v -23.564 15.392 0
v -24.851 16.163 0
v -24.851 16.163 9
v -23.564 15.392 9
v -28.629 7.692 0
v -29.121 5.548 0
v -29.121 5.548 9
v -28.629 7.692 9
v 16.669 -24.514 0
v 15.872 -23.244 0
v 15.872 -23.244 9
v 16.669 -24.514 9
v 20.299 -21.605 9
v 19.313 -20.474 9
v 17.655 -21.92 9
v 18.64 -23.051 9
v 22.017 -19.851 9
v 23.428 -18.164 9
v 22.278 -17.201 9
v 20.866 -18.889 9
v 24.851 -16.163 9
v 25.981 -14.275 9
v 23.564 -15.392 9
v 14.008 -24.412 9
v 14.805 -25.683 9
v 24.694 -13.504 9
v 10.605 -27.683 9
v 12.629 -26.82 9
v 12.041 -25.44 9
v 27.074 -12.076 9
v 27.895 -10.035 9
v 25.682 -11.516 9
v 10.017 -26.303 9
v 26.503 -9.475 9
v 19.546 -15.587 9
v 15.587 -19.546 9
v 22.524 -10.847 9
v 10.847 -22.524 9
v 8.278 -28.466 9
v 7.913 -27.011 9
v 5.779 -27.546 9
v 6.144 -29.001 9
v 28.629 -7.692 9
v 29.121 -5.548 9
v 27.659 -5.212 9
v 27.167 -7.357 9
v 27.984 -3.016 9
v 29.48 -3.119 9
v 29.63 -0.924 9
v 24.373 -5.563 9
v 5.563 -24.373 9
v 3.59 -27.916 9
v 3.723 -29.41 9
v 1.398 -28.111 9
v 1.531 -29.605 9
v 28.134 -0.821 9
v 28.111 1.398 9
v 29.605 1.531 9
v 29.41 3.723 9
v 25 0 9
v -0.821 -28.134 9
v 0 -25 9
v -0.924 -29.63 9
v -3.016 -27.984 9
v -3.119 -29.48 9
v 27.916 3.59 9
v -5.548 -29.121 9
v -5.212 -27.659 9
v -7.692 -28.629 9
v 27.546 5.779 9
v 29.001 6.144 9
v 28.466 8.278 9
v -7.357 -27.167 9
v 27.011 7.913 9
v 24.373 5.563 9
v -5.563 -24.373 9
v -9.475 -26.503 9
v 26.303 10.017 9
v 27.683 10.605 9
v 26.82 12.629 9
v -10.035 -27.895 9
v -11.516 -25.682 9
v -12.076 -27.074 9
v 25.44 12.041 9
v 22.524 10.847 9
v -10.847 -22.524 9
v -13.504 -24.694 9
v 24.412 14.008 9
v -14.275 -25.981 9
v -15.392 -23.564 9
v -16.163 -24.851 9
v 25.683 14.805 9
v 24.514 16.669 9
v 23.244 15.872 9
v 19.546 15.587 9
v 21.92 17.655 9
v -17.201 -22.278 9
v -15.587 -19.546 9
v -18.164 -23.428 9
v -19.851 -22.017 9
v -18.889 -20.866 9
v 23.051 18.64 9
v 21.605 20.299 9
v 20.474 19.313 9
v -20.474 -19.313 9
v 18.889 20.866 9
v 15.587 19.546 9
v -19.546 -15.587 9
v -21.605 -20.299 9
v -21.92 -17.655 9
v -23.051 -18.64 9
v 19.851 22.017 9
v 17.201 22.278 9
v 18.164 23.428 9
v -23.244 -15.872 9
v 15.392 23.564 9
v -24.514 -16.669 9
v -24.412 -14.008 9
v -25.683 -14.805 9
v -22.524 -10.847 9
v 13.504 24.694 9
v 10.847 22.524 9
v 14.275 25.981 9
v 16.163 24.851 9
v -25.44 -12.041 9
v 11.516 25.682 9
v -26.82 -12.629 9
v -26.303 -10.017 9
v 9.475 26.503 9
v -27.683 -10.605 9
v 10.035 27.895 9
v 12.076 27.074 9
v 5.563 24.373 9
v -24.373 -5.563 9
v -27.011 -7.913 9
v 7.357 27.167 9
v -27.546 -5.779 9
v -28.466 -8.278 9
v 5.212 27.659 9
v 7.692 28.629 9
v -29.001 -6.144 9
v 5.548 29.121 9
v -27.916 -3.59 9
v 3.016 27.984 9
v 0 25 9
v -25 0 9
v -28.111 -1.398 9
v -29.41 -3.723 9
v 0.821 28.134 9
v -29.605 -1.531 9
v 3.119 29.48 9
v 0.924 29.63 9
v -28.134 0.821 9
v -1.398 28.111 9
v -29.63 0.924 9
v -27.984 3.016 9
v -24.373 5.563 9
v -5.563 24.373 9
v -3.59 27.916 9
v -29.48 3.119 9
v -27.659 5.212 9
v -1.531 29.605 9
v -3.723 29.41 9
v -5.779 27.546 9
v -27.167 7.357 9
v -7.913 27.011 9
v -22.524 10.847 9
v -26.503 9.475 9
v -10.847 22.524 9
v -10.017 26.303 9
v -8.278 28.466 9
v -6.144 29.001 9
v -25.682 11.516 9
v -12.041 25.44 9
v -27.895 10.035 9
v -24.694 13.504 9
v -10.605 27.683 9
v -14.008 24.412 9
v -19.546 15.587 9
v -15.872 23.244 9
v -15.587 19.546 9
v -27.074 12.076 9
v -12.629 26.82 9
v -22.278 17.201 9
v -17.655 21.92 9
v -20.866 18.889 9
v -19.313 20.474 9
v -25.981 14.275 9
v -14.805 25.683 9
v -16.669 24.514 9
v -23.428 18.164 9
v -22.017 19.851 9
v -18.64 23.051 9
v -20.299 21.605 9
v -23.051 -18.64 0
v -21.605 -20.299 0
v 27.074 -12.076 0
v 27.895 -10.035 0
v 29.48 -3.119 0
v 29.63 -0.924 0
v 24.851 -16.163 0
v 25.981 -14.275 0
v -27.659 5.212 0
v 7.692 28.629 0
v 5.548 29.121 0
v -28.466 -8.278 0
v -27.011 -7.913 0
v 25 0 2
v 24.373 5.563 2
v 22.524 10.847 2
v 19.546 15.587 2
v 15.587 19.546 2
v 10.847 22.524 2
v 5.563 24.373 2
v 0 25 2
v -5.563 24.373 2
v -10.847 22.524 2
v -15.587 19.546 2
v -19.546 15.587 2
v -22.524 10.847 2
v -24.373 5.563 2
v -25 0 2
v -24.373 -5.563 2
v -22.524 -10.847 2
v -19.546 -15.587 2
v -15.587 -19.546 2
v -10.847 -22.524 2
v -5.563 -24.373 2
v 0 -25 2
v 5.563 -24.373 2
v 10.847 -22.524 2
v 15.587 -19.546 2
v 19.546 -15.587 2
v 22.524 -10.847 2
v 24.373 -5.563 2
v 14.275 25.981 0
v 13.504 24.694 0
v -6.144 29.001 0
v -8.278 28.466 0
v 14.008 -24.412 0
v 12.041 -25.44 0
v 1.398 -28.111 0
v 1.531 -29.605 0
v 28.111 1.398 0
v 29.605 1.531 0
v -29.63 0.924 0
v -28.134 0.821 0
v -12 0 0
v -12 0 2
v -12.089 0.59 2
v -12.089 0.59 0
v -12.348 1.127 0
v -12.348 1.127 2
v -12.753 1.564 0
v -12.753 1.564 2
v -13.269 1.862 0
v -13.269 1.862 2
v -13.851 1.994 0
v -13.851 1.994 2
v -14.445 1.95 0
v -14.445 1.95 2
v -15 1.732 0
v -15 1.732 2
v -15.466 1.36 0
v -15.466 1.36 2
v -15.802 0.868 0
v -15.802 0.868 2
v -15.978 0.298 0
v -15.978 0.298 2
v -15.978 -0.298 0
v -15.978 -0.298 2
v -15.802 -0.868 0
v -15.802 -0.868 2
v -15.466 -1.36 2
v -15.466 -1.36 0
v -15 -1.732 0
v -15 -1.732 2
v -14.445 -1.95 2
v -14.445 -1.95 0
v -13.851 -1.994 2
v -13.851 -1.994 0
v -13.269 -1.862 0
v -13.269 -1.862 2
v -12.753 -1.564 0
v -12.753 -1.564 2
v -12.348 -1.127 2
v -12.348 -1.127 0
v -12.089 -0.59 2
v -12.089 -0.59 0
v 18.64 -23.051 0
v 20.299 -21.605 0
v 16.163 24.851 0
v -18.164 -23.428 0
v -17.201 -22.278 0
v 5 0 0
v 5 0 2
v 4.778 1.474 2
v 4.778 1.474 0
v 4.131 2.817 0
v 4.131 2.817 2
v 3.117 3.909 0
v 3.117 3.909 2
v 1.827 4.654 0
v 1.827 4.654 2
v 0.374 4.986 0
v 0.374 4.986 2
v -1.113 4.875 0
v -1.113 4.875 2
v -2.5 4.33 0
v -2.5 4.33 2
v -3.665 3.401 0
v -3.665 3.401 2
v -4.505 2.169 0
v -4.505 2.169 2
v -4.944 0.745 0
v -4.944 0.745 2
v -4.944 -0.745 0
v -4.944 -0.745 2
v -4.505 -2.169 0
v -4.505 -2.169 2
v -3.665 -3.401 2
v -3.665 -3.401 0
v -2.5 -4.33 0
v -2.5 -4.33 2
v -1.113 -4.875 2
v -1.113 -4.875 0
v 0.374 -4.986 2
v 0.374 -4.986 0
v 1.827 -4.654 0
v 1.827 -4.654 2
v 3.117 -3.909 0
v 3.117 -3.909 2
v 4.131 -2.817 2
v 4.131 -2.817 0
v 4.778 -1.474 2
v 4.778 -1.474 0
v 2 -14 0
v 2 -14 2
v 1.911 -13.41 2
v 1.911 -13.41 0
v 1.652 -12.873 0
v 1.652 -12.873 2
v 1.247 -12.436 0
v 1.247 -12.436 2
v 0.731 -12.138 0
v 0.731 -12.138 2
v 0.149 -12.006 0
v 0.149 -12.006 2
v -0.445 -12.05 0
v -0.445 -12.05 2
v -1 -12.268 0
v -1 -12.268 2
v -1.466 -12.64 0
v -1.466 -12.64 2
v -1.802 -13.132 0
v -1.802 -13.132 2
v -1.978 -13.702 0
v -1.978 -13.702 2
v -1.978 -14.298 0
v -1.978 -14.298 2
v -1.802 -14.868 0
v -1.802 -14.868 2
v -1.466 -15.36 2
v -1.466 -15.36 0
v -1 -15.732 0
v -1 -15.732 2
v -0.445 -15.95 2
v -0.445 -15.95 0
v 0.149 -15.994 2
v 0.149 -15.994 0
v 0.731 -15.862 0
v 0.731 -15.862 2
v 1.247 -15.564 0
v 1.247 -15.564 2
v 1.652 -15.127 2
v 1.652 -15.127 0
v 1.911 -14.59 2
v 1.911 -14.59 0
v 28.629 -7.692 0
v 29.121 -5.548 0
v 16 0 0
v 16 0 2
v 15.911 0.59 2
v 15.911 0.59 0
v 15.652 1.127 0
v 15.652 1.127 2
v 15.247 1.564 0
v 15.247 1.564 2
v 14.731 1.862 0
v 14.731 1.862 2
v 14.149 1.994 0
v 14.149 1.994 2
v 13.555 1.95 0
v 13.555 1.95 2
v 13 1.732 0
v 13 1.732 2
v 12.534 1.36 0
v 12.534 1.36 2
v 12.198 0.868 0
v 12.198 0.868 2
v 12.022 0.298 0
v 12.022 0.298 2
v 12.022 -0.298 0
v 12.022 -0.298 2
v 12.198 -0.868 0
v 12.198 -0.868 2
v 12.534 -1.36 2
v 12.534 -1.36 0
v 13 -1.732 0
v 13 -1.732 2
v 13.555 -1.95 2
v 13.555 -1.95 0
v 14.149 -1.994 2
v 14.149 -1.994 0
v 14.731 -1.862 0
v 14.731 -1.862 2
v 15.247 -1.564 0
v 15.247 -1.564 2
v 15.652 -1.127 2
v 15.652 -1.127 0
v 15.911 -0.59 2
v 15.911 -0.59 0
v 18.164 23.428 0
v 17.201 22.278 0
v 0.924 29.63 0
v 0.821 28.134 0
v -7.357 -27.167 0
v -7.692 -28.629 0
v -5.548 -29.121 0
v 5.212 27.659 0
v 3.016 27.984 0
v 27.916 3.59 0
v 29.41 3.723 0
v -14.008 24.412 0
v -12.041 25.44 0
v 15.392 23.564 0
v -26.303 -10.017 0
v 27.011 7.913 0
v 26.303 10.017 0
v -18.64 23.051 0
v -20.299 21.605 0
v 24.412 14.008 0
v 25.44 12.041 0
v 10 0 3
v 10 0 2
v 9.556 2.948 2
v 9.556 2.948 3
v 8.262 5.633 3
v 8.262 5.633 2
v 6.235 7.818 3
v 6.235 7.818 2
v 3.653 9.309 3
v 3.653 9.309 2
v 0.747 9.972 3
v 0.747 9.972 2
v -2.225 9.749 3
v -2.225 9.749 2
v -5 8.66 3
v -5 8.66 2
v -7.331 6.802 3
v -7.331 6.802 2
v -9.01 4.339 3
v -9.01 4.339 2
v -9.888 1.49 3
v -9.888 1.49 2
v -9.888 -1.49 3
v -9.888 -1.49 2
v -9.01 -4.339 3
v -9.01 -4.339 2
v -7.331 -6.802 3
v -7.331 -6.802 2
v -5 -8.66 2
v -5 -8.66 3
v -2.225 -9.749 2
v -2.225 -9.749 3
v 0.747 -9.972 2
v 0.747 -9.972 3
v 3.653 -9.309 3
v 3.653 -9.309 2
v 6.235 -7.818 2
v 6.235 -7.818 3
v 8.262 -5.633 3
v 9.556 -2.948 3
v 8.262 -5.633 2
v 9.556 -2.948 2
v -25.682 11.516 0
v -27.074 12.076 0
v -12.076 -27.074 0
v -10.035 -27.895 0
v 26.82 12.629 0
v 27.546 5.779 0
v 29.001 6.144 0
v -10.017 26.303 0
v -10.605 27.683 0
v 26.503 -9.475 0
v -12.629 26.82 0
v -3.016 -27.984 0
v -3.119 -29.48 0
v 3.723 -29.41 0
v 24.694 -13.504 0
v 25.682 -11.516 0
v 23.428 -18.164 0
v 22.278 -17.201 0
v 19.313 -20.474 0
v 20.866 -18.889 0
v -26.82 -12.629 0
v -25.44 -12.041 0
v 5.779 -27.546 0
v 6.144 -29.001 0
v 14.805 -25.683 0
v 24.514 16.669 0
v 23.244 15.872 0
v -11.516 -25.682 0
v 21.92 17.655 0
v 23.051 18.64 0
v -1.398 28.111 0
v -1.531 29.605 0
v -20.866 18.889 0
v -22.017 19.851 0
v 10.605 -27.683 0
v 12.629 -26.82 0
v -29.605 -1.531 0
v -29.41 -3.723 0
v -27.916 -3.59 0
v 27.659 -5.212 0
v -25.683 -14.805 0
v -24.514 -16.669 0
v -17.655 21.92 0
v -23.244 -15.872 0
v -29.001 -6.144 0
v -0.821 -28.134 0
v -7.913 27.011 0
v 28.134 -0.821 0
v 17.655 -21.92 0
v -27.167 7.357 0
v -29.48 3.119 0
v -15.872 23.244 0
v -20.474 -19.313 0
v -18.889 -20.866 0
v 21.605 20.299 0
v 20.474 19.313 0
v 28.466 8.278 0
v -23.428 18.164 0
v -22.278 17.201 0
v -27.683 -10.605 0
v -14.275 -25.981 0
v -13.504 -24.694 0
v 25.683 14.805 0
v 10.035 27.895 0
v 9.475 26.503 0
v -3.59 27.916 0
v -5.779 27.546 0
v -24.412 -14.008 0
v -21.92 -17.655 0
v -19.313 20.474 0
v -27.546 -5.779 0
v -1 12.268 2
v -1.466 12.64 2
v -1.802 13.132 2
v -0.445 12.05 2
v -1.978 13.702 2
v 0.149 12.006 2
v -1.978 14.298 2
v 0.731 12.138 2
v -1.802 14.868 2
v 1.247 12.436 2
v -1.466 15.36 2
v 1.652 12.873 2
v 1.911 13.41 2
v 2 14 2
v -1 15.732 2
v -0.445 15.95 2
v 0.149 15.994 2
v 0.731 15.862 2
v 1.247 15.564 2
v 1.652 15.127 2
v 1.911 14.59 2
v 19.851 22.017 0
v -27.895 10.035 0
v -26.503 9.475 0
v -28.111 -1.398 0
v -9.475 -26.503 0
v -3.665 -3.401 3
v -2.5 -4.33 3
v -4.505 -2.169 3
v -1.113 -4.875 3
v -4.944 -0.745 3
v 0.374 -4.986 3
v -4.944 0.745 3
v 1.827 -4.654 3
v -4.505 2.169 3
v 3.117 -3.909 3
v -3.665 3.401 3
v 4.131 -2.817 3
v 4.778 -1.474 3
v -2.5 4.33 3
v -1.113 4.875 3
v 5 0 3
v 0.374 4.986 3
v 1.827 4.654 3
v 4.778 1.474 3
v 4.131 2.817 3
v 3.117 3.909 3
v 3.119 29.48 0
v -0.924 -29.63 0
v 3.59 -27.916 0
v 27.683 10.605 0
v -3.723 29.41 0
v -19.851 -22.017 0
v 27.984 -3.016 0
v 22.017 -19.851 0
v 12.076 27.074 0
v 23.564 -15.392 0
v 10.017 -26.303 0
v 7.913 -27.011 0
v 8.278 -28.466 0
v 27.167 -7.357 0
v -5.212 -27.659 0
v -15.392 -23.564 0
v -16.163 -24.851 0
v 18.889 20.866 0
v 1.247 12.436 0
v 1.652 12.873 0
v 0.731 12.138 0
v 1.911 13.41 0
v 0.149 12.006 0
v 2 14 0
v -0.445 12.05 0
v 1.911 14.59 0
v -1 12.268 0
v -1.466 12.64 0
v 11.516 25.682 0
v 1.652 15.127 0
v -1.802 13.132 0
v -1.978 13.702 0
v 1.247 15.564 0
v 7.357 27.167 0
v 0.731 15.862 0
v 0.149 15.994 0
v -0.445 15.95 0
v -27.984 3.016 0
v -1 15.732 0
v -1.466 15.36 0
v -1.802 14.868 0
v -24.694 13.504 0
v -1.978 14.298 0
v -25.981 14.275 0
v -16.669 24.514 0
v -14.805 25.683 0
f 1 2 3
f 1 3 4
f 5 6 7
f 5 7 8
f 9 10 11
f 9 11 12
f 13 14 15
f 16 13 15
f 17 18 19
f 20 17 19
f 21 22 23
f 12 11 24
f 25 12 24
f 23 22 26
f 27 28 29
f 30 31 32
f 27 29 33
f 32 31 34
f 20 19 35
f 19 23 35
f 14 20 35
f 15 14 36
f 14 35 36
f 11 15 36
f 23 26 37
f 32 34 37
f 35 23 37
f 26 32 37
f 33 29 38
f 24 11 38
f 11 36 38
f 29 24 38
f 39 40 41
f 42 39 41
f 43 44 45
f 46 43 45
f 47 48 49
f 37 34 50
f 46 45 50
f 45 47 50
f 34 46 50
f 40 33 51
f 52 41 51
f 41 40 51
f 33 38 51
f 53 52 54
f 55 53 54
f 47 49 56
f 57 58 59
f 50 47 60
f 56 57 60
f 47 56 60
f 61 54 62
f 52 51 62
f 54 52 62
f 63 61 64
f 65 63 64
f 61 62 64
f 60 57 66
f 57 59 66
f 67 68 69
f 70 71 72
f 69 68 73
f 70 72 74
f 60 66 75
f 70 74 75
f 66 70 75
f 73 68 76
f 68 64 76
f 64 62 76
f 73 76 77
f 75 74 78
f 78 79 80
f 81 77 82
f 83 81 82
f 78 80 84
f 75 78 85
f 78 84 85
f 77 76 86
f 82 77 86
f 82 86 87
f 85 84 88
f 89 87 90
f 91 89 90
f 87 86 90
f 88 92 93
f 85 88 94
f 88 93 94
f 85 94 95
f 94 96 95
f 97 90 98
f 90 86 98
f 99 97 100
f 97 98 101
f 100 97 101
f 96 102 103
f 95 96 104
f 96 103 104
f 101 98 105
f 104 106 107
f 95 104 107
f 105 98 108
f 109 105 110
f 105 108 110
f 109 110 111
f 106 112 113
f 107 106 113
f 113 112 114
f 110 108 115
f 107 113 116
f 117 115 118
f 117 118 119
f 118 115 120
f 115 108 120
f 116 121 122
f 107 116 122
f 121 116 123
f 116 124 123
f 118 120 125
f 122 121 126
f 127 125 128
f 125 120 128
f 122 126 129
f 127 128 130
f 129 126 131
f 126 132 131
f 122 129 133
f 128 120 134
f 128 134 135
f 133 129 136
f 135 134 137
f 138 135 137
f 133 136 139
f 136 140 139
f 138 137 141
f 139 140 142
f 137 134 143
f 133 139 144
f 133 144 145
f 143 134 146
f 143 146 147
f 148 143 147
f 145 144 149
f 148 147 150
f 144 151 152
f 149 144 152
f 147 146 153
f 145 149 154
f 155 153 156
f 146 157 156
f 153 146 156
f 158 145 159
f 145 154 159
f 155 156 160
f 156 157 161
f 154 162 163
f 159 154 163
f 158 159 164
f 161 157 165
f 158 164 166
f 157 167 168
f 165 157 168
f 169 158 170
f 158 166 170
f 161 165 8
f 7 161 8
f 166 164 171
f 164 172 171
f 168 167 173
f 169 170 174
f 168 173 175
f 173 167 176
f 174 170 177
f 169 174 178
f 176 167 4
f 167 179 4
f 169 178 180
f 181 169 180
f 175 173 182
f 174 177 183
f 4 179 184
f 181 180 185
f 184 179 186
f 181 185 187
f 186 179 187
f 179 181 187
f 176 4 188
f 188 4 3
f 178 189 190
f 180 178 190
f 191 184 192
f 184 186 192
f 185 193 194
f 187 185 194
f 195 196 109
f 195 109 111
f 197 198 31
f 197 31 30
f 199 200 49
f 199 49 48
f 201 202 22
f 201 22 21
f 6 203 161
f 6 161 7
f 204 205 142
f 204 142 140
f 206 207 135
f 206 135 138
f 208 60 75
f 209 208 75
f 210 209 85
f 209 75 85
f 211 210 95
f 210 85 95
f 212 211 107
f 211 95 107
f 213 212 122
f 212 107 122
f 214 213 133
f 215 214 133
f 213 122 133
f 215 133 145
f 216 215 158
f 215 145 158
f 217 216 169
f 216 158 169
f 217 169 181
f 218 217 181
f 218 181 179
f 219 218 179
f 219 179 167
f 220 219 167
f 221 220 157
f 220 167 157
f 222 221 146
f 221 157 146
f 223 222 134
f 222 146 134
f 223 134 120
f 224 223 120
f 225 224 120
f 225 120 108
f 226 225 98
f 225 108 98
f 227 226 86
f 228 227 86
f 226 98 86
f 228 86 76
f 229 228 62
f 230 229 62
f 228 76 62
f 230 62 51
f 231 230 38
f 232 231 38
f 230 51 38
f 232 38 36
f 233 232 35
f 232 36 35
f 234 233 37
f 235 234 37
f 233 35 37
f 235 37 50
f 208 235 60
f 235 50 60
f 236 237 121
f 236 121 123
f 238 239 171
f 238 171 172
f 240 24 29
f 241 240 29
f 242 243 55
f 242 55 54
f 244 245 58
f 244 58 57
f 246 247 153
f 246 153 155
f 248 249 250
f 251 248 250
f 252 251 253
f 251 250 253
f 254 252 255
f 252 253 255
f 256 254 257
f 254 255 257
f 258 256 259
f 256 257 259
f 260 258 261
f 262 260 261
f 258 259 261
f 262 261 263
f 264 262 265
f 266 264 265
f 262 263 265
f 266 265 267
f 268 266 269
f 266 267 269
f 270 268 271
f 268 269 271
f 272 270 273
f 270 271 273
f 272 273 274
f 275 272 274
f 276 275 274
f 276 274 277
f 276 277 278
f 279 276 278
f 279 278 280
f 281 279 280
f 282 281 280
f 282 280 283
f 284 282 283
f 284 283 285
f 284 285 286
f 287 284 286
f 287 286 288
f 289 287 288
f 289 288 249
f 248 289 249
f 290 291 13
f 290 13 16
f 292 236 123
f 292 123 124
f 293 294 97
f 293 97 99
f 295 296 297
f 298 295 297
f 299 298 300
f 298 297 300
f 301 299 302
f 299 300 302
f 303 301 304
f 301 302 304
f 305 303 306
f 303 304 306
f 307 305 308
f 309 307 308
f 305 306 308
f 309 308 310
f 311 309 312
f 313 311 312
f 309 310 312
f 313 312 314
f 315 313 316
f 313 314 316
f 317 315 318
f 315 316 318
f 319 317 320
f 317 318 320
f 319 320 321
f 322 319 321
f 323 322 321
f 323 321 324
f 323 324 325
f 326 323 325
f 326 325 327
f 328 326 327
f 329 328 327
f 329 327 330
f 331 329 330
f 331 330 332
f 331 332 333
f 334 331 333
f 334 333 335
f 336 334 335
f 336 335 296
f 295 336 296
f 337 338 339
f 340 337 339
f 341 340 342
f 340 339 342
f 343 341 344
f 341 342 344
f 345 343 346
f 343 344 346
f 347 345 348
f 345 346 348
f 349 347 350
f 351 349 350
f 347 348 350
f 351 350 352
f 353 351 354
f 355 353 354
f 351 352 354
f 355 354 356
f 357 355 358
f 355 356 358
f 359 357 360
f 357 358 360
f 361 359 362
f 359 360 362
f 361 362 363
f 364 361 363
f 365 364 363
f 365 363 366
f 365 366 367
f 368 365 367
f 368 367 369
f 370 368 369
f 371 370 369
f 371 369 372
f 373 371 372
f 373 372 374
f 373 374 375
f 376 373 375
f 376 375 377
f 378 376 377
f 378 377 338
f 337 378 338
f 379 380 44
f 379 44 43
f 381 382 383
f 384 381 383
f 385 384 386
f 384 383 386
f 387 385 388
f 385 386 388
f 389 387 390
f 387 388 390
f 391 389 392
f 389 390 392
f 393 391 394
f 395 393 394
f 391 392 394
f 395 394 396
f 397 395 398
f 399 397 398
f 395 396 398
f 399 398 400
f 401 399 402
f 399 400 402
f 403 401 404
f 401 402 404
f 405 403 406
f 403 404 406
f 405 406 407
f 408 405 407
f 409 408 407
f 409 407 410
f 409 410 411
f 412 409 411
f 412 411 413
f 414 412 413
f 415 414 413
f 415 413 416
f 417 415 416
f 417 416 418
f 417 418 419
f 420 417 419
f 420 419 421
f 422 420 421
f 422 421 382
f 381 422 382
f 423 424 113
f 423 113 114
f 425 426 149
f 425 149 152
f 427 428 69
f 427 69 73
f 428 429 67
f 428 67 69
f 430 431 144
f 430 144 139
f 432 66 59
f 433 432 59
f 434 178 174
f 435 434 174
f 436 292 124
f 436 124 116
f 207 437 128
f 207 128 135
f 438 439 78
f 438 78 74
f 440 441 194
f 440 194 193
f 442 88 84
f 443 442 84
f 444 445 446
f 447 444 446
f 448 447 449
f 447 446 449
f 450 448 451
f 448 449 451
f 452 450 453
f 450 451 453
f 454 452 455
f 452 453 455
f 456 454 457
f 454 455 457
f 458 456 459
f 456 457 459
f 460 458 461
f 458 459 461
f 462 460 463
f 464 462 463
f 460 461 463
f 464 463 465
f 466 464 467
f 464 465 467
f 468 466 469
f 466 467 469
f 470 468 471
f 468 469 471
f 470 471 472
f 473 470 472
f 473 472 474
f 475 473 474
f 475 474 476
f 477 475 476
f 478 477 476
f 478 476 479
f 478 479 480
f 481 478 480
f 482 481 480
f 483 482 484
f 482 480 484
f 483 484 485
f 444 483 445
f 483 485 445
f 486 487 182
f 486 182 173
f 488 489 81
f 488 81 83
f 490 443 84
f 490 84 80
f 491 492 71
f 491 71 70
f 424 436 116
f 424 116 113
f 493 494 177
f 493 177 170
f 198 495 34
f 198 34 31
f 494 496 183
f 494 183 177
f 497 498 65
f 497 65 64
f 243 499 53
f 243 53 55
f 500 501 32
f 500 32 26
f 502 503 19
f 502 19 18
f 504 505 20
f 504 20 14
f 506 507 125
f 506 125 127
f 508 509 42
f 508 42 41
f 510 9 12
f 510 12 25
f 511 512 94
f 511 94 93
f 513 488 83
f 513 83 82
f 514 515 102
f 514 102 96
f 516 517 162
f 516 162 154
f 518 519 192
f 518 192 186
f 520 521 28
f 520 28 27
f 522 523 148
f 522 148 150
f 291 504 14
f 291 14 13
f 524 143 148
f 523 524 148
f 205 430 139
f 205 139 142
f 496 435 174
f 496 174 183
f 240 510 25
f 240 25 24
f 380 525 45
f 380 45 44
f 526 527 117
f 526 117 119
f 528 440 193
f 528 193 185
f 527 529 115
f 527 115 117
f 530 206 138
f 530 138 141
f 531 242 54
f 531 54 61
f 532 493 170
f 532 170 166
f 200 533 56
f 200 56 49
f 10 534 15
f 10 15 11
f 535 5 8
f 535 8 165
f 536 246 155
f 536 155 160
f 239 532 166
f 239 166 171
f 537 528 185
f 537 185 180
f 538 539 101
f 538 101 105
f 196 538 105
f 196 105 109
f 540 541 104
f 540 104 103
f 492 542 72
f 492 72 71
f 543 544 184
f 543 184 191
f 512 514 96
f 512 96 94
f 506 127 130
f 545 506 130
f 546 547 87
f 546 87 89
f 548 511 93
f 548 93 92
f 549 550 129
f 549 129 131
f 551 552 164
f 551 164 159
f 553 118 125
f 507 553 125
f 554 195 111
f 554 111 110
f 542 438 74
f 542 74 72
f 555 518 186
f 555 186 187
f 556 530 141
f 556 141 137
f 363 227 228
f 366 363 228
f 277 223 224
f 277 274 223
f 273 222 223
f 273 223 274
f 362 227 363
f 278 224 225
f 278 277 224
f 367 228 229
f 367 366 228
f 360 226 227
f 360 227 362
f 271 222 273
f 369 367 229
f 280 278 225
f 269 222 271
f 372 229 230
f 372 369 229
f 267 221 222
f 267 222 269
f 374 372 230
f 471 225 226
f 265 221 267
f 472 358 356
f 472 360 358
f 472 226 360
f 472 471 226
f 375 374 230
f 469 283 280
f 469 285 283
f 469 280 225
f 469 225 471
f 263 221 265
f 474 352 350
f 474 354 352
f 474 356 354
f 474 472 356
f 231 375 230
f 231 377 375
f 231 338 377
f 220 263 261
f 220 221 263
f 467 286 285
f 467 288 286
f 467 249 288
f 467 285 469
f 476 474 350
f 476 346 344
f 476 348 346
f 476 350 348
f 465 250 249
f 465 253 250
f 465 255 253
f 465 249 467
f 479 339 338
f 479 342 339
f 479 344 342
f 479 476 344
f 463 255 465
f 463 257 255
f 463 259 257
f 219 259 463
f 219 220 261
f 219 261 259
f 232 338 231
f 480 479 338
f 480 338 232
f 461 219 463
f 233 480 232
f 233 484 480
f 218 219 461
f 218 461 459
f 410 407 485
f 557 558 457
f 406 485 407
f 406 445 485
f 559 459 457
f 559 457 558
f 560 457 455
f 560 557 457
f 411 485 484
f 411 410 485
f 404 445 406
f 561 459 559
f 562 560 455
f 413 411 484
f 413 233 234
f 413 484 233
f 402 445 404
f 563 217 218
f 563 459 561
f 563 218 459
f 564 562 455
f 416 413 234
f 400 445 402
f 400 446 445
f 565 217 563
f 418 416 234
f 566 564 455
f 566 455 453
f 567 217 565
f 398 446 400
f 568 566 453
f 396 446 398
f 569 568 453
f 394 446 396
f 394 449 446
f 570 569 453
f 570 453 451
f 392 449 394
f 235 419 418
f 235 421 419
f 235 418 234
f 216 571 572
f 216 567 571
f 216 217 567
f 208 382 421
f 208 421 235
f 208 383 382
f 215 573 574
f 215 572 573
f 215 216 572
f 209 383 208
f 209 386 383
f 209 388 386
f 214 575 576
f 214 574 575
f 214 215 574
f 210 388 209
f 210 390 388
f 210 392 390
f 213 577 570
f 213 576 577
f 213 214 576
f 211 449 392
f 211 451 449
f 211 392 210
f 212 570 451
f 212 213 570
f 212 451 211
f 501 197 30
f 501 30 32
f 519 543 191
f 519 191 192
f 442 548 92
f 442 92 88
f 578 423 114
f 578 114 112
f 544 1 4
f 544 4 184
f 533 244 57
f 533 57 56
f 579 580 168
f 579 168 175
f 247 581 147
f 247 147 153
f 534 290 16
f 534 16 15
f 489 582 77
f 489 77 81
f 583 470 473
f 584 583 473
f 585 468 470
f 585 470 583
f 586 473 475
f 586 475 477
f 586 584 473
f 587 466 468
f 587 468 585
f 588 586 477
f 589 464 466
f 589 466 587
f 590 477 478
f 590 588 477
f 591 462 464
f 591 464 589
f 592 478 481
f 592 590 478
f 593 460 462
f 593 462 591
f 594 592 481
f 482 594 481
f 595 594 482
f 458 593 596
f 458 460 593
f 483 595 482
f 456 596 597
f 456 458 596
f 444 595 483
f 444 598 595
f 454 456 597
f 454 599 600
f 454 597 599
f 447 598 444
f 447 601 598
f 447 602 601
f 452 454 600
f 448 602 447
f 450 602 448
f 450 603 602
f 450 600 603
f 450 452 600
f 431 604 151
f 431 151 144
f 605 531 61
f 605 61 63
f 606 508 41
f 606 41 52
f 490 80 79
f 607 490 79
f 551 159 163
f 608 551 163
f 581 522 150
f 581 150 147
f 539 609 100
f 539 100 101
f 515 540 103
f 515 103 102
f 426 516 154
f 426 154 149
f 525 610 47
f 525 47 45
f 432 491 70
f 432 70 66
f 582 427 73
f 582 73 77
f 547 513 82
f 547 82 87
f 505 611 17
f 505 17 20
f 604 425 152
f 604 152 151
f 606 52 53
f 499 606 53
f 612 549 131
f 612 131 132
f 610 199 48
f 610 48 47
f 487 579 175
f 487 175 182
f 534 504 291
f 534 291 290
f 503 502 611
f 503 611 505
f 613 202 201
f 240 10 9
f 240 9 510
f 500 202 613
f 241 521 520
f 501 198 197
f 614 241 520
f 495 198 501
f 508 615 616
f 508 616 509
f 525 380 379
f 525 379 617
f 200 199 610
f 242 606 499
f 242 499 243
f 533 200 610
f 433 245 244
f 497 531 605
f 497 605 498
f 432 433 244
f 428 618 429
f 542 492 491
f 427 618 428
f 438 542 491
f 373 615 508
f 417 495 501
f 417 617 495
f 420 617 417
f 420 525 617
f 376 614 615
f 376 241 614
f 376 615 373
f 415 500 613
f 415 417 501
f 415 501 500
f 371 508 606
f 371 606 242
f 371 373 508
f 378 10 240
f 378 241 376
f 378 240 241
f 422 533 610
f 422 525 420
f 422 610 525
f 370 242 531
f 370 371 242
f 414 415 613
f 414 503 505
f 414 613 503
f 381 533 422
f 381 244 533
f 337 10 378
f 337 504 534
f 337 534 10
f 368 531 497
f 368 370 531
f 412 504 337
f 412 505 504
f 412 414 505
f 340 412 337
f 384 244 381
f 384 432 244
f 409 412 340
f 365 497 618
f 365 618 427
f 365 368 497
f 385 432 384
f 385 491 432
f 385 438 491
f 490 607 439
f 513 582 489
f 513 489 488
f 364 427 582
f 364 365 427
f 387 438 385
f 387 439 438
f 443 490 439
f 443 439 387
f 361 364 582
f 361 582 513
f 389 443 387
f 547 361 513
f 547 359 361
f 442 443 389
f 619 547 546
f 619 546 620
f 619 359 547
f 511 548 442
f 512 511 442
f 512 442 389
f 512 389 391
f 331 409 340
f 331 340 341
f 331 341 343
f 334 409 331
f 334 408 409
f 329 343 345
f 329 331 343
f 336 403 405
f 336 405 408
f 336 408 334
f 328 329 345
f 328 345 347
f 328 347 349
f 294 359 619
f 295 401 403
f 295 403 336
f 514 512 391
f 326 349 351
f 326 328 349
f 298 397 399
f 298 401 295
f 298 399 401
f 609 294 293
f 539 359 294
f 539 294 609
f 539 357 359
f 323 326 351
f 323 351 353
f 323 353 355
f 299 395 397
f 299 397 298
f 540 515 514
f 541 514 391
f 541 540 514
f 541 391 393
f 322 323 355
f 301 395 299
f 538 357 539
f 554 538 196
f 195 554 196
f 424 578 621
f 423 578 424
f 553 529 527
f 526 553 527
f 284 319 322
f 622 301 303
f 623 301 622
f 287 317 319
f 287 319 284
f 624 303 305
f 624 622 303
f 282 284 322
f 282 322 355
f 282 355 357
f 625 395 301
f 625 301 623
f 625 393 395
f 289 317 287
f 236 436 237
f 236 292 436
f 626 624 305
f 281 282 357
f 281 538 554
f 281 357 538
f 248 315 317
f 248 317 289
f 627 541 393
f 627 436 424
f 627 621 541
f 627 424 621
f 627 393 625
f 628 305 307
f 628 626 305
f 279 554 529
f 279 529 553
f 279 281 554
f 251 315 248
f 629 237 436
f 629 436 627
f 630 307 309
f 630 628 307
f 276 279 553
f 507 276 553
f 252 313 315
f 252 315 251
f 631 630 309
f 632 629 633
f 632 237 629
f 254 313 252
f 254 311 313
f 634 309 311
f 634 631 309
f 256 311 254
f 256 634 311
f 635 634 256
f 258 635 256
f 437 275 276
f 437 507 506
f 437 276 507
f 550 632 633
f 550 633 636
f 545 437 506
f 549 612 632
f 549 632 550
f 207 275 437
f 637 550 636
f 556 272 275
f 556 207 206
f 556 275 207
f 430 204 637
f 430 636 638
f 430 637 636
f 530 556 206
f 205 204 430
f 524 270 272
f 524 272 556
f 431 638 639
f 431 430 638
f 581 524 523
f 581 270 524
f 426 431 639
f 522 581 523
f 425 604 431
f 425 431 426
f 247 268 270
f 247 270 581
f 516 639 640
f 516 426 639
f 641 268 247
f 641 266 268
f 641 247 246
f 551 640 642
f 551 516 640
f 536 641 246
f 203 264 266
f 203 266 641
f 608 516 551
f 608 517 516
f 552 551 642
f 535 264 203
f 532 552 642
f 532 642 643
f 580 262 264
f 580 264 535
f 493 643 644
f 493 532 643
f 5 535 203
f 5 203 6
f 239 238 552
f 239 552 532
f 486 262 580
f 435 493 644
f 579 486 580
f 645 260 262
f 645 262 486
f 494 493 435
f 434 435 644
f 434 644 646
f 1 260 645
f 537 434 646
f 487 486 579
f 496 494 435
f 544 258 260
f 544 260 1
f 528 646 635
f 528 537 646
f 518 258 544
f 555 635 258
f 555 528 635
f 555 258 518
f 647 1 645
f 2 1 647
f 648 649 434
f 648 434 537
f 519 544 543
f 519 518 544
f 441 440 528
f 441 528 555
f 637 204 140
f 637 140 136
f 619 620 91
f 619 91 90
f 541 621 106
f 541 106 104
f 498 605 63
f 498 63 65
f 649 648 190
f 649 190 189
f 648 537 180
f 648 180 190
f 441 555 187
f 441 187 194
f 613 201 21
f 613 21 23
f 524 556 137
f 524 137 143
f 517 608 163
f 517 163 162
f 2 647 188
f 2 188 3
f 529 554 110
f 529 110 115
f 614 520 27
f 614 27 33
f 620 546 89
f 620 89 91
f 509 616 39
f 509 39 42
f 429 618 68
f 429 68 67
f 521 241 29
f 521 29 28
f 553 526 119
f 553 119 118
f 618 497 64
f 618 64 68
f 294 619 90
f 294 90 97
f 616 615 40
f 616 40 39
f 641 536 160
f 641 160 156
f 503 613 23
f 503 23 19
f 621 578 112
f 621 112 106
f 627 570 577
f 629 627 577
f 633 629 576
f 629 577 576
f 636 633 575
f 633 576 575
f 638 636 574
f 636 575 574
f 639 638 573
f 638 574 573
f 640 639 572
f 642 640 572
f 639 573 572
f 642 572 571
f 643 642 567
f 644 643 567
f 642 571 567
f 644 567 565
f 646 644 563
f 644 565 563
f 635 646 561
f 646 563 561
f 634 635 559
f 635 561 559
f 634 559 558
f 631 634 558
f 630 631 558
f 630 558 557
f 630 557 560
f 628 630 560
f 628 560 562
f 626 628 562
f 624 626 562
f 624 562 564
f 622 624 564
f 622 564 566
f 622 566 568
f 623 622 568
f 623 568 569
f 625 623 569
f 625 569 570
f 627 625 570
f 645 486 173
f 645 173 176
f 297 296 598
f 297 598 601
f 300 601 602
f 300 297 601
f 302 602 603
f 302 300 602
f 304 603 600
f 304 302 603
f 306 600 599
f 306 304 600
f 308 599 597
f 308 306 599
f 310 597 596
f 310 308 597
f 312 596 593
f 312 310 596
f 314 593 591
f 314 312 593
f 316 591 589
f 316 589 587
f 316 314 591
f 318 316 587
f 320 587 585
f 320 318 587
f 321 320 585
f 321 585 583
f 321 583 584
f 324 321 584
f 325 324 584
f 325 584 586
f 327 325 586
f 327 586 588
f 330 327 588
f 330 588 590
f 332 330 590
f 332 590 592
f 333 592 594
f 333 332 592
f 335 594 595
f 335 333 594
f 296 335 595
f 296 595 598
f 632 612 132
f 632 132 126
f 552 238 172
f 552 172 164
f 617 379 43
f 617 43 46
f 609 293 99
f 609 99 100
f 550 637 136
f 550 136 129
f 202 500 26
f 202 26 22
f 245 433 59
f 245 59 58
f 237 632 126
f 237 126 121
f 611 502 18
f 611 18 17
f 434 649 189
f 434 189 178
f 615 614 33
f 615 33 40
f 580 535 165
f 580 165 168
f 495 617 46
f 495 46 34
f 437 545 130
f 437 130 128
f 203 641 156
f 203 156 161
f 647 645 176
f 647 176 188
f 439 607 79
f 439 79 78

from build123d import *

# Parameters (mm, degrees)
PAD_DEPTH       = 9
SKETCH001_R     = 25
POCKET_DEPTH    = 7
SKETCH002_R     = 5
POCKET001_DEPTH = 2.001
SKETCH003_R     = 2
POCKET002_DEPTH = 2.001
SKETCH004_R     = 10
SKETCH004_R_2   = 5
PAD001_DEPTH    = 1


with BuildPart() as part:
    # Sketch → Pad (new body)
    with BuildSketch(Plane.XY):
        Polygon((-26.503024, 9.47509), (-27.894659, 10.03487), (-27.073648, 12.075934), (-25.682014, 11.516154), (-24.694497, 13.504422), (-25.98143, 14.27501), (-24.851234, 16.162511), (-23.564302, 15.391923), (-22.27791, 17.201231), (-23.428452, 18.163652), (-22.016901, 19.851113), (-20.866359, 18.888692), (-19.312767, 20.474488), (-20.298587, 21.605045), (-18.640438, 23.050915), (-17.654617, 21.920358), (-15.872079, 23.243596), (-16.668904, 24.514449), (-14.804986, 25.683127), (-14.00816, 24.412273), (-12.040568, 25.440369), (-12.628778, 26.820227), (-10.604979, 27.682919), (-10.016776, 26.303077), (-7.912578, 27.010715), (-8.277689, 28.465602), (-6.143855, 29.001097), (-5.778745, 27.546211), (-3.589754, 27.915968), (-3.722775, 29.410059), (-1.531443, 29.605156), (-1.398422, 28.111066), (0.821461, 28.133838), (0.923805, 29.630342), (3.118678, 29.480238), (3.016334, 27.983734), (5.21245, 27.658959), (5.547638, 29.121029), (7.692007, 28.629419), (7.356819, 27.167349), (9.47509, 26.503024), (10.03487, 27.894659), (12.075934, 27.073648), (11.516154, 25.682014), (13.504422, 24.694497), (14.27501, 25.98143), (16.162511, 24.851234), (15.391923, 23.564302), (17.201231, 22.27791), (18.163652, 23.428452), (19.851113, 22.016901), (18.888692, 20.866359), (20.474488, 19.312767), (21.605045, 20.298587), (23.050915, 18.640438), (21.920358, 17.654617), (23.243596, 15.872079), (24.514448, 16.668904), (25.683127, 14.804986), (24.412273, 14.00816), (25.440369, 12.040568), (26.820227, 12.628778), (27.682935, 10.604985), (26.303077, 10.016776), (27.010715, 7.912578), (28.465602, 8.277689), (29.001097, 6.143855), (27.546211, 5.778745), (27.915968, 3.589754), (29.410059, 3.722775), (29.605156, 1.531443), (28.111066, 1.398422), (28.133838, -0.821461), (29.630342, -0.923805), (29.480238, -3.118678), (27.983734, -3.016334), (27.658959, -5.21245), (29.121029, -5.547638), (28.629419, -7.692007), (27.167349, -7.356819), (26.503024, -9.47509), (27.894659, -10.03487), (27.073648, -12.075934), (25.682014, -11.516154), (24.694497, -13.504422), (25.98143, -14.27501), (24.851235, -16.162511), (23.564302, -15.391923), (22.27791, -17.201231), (23.428452, -18.163652), (22.016901, -19.851113), (20.866359, -18.888692), (19.312767, -20.474488), (20.298587, -21.605045), (18.640438, -23.050915), (17.654617, -21.920358), (15.872079, -23.243596), (16.668904, -24.514449), (14.804986, -25.683127), (14.00816, -24.412273), (12.040568, -25.440369), (12.628778, -26.820227), (10.604986, -27.682935), (10.016776, -26.303077), (7.912578, -27.010715), (8.277689, -28.465602), (6.143855, -29.001097), (5.778745, -27.546211), (3.589754, -27.915968), (3.722775, -29.410059), (1.531443, -29.605156), (1.398422, -28.111066), (-0.821461, -28.133838), (-0.923805, -29.630342), (-3.118678, -29.480238), (-3.016334, -27.983734), (-5.21245, -27.658959), (-5.547638, -29.121029), (-7.692007, -28.629419), (-7.356819, -27.167349), (-9.47509, -26.503024), (-10.03487, -27.894659), (-12.075934, -27.073648), (-11.516154, -25.682014), (-13.504422, -24.694497), (-14.27501, -25.98143), (-16.162511, -24.851234), (-15.391923, -23.564302), (-17.201231, -22.27791), (-18.163652, -23.428452), (-19.851113, -22.016901), (-18.888692, -20.866359), (-20.474488, -19.312767), (-21.605045, -20.298587), (-23.050915, -18.640438), (-21.920358, -17.654617), (-23.243596, -15.872079), (-24.514449, -16.668904), (-25.683127, -14.804986), (-24.412273, -14.00816), (-25.440369, -12.040568), (-26.820227, -12.628778), (-27.682935, -10.604985), (-26.303077, -10.016776), (-27.010715, -7.912578), (-28.465602, -8.277689), (-29.001097, -6.143855), (-27.546211, -5.778745), (-27.915968, -3.589754), (-29.410059, -3.722775), (-29.605156, -1.531443), (-28.111066, -1.398422), (-28.133838, 0.821461), (-29.630342, 0.923805), (-29.480238, 3.118678), (-27.983734, 3.016334), (-27.658959, 5.21245), (-29.121029, 5.547638), (-28.629419, 7.692007), (-27.167349, 7.356819), align=None)
    extrude(amount=PAD_DEPTH)

    # Sketch001 (on Face162 of Pad) → Pocket (cut)
    with BuildSketch(Plane.XY.offset(9)):
        Circle(SKETCH001_R)
    extrude(amount=-POCKET_DEPTH, mode=Mode.SUBTRACT)

    # Sketch002 (on Face164 of Pocket) → Pocket001 (cut, through all)
    with BuildSketch(Plane.XY.offset(2)):
        Circle(SKETCH002_R)
    extrude(amount=-POCKET001_DEPTH, mode=Mode.SUBTRACT)

    # Sketch003 (on Face165 of Pocket001) → Pocket002 (cut, through all)
    with BuildSketch(Plane.XY.offset(2)):
        with Locations((0, 14)):
            Circle(SKETCH003_R)
        with Locations((14, 0)):
            Circle(SKETCH003_R)
        with Locations((0, -14)):
            Circle(SKETCH003_R)
        with Locations((-14, 0)):
            Circle(SKETCH003_R)
    extrude(amount=-POCKET002_DEPTH, mode=Mode.SUBTRACT)

    # Sketch004 (on Face169 of Pocket002) → Pad001 (join)
    with BuildSketch(Plane.XY.offset(2)):
        Circle(SKETCH004_R)
        Circle(SKETCH004_R_2, mode=Mode.SUBTRACT)
    extrude(amount=PAD001_DEPTH)


solid = part.part
